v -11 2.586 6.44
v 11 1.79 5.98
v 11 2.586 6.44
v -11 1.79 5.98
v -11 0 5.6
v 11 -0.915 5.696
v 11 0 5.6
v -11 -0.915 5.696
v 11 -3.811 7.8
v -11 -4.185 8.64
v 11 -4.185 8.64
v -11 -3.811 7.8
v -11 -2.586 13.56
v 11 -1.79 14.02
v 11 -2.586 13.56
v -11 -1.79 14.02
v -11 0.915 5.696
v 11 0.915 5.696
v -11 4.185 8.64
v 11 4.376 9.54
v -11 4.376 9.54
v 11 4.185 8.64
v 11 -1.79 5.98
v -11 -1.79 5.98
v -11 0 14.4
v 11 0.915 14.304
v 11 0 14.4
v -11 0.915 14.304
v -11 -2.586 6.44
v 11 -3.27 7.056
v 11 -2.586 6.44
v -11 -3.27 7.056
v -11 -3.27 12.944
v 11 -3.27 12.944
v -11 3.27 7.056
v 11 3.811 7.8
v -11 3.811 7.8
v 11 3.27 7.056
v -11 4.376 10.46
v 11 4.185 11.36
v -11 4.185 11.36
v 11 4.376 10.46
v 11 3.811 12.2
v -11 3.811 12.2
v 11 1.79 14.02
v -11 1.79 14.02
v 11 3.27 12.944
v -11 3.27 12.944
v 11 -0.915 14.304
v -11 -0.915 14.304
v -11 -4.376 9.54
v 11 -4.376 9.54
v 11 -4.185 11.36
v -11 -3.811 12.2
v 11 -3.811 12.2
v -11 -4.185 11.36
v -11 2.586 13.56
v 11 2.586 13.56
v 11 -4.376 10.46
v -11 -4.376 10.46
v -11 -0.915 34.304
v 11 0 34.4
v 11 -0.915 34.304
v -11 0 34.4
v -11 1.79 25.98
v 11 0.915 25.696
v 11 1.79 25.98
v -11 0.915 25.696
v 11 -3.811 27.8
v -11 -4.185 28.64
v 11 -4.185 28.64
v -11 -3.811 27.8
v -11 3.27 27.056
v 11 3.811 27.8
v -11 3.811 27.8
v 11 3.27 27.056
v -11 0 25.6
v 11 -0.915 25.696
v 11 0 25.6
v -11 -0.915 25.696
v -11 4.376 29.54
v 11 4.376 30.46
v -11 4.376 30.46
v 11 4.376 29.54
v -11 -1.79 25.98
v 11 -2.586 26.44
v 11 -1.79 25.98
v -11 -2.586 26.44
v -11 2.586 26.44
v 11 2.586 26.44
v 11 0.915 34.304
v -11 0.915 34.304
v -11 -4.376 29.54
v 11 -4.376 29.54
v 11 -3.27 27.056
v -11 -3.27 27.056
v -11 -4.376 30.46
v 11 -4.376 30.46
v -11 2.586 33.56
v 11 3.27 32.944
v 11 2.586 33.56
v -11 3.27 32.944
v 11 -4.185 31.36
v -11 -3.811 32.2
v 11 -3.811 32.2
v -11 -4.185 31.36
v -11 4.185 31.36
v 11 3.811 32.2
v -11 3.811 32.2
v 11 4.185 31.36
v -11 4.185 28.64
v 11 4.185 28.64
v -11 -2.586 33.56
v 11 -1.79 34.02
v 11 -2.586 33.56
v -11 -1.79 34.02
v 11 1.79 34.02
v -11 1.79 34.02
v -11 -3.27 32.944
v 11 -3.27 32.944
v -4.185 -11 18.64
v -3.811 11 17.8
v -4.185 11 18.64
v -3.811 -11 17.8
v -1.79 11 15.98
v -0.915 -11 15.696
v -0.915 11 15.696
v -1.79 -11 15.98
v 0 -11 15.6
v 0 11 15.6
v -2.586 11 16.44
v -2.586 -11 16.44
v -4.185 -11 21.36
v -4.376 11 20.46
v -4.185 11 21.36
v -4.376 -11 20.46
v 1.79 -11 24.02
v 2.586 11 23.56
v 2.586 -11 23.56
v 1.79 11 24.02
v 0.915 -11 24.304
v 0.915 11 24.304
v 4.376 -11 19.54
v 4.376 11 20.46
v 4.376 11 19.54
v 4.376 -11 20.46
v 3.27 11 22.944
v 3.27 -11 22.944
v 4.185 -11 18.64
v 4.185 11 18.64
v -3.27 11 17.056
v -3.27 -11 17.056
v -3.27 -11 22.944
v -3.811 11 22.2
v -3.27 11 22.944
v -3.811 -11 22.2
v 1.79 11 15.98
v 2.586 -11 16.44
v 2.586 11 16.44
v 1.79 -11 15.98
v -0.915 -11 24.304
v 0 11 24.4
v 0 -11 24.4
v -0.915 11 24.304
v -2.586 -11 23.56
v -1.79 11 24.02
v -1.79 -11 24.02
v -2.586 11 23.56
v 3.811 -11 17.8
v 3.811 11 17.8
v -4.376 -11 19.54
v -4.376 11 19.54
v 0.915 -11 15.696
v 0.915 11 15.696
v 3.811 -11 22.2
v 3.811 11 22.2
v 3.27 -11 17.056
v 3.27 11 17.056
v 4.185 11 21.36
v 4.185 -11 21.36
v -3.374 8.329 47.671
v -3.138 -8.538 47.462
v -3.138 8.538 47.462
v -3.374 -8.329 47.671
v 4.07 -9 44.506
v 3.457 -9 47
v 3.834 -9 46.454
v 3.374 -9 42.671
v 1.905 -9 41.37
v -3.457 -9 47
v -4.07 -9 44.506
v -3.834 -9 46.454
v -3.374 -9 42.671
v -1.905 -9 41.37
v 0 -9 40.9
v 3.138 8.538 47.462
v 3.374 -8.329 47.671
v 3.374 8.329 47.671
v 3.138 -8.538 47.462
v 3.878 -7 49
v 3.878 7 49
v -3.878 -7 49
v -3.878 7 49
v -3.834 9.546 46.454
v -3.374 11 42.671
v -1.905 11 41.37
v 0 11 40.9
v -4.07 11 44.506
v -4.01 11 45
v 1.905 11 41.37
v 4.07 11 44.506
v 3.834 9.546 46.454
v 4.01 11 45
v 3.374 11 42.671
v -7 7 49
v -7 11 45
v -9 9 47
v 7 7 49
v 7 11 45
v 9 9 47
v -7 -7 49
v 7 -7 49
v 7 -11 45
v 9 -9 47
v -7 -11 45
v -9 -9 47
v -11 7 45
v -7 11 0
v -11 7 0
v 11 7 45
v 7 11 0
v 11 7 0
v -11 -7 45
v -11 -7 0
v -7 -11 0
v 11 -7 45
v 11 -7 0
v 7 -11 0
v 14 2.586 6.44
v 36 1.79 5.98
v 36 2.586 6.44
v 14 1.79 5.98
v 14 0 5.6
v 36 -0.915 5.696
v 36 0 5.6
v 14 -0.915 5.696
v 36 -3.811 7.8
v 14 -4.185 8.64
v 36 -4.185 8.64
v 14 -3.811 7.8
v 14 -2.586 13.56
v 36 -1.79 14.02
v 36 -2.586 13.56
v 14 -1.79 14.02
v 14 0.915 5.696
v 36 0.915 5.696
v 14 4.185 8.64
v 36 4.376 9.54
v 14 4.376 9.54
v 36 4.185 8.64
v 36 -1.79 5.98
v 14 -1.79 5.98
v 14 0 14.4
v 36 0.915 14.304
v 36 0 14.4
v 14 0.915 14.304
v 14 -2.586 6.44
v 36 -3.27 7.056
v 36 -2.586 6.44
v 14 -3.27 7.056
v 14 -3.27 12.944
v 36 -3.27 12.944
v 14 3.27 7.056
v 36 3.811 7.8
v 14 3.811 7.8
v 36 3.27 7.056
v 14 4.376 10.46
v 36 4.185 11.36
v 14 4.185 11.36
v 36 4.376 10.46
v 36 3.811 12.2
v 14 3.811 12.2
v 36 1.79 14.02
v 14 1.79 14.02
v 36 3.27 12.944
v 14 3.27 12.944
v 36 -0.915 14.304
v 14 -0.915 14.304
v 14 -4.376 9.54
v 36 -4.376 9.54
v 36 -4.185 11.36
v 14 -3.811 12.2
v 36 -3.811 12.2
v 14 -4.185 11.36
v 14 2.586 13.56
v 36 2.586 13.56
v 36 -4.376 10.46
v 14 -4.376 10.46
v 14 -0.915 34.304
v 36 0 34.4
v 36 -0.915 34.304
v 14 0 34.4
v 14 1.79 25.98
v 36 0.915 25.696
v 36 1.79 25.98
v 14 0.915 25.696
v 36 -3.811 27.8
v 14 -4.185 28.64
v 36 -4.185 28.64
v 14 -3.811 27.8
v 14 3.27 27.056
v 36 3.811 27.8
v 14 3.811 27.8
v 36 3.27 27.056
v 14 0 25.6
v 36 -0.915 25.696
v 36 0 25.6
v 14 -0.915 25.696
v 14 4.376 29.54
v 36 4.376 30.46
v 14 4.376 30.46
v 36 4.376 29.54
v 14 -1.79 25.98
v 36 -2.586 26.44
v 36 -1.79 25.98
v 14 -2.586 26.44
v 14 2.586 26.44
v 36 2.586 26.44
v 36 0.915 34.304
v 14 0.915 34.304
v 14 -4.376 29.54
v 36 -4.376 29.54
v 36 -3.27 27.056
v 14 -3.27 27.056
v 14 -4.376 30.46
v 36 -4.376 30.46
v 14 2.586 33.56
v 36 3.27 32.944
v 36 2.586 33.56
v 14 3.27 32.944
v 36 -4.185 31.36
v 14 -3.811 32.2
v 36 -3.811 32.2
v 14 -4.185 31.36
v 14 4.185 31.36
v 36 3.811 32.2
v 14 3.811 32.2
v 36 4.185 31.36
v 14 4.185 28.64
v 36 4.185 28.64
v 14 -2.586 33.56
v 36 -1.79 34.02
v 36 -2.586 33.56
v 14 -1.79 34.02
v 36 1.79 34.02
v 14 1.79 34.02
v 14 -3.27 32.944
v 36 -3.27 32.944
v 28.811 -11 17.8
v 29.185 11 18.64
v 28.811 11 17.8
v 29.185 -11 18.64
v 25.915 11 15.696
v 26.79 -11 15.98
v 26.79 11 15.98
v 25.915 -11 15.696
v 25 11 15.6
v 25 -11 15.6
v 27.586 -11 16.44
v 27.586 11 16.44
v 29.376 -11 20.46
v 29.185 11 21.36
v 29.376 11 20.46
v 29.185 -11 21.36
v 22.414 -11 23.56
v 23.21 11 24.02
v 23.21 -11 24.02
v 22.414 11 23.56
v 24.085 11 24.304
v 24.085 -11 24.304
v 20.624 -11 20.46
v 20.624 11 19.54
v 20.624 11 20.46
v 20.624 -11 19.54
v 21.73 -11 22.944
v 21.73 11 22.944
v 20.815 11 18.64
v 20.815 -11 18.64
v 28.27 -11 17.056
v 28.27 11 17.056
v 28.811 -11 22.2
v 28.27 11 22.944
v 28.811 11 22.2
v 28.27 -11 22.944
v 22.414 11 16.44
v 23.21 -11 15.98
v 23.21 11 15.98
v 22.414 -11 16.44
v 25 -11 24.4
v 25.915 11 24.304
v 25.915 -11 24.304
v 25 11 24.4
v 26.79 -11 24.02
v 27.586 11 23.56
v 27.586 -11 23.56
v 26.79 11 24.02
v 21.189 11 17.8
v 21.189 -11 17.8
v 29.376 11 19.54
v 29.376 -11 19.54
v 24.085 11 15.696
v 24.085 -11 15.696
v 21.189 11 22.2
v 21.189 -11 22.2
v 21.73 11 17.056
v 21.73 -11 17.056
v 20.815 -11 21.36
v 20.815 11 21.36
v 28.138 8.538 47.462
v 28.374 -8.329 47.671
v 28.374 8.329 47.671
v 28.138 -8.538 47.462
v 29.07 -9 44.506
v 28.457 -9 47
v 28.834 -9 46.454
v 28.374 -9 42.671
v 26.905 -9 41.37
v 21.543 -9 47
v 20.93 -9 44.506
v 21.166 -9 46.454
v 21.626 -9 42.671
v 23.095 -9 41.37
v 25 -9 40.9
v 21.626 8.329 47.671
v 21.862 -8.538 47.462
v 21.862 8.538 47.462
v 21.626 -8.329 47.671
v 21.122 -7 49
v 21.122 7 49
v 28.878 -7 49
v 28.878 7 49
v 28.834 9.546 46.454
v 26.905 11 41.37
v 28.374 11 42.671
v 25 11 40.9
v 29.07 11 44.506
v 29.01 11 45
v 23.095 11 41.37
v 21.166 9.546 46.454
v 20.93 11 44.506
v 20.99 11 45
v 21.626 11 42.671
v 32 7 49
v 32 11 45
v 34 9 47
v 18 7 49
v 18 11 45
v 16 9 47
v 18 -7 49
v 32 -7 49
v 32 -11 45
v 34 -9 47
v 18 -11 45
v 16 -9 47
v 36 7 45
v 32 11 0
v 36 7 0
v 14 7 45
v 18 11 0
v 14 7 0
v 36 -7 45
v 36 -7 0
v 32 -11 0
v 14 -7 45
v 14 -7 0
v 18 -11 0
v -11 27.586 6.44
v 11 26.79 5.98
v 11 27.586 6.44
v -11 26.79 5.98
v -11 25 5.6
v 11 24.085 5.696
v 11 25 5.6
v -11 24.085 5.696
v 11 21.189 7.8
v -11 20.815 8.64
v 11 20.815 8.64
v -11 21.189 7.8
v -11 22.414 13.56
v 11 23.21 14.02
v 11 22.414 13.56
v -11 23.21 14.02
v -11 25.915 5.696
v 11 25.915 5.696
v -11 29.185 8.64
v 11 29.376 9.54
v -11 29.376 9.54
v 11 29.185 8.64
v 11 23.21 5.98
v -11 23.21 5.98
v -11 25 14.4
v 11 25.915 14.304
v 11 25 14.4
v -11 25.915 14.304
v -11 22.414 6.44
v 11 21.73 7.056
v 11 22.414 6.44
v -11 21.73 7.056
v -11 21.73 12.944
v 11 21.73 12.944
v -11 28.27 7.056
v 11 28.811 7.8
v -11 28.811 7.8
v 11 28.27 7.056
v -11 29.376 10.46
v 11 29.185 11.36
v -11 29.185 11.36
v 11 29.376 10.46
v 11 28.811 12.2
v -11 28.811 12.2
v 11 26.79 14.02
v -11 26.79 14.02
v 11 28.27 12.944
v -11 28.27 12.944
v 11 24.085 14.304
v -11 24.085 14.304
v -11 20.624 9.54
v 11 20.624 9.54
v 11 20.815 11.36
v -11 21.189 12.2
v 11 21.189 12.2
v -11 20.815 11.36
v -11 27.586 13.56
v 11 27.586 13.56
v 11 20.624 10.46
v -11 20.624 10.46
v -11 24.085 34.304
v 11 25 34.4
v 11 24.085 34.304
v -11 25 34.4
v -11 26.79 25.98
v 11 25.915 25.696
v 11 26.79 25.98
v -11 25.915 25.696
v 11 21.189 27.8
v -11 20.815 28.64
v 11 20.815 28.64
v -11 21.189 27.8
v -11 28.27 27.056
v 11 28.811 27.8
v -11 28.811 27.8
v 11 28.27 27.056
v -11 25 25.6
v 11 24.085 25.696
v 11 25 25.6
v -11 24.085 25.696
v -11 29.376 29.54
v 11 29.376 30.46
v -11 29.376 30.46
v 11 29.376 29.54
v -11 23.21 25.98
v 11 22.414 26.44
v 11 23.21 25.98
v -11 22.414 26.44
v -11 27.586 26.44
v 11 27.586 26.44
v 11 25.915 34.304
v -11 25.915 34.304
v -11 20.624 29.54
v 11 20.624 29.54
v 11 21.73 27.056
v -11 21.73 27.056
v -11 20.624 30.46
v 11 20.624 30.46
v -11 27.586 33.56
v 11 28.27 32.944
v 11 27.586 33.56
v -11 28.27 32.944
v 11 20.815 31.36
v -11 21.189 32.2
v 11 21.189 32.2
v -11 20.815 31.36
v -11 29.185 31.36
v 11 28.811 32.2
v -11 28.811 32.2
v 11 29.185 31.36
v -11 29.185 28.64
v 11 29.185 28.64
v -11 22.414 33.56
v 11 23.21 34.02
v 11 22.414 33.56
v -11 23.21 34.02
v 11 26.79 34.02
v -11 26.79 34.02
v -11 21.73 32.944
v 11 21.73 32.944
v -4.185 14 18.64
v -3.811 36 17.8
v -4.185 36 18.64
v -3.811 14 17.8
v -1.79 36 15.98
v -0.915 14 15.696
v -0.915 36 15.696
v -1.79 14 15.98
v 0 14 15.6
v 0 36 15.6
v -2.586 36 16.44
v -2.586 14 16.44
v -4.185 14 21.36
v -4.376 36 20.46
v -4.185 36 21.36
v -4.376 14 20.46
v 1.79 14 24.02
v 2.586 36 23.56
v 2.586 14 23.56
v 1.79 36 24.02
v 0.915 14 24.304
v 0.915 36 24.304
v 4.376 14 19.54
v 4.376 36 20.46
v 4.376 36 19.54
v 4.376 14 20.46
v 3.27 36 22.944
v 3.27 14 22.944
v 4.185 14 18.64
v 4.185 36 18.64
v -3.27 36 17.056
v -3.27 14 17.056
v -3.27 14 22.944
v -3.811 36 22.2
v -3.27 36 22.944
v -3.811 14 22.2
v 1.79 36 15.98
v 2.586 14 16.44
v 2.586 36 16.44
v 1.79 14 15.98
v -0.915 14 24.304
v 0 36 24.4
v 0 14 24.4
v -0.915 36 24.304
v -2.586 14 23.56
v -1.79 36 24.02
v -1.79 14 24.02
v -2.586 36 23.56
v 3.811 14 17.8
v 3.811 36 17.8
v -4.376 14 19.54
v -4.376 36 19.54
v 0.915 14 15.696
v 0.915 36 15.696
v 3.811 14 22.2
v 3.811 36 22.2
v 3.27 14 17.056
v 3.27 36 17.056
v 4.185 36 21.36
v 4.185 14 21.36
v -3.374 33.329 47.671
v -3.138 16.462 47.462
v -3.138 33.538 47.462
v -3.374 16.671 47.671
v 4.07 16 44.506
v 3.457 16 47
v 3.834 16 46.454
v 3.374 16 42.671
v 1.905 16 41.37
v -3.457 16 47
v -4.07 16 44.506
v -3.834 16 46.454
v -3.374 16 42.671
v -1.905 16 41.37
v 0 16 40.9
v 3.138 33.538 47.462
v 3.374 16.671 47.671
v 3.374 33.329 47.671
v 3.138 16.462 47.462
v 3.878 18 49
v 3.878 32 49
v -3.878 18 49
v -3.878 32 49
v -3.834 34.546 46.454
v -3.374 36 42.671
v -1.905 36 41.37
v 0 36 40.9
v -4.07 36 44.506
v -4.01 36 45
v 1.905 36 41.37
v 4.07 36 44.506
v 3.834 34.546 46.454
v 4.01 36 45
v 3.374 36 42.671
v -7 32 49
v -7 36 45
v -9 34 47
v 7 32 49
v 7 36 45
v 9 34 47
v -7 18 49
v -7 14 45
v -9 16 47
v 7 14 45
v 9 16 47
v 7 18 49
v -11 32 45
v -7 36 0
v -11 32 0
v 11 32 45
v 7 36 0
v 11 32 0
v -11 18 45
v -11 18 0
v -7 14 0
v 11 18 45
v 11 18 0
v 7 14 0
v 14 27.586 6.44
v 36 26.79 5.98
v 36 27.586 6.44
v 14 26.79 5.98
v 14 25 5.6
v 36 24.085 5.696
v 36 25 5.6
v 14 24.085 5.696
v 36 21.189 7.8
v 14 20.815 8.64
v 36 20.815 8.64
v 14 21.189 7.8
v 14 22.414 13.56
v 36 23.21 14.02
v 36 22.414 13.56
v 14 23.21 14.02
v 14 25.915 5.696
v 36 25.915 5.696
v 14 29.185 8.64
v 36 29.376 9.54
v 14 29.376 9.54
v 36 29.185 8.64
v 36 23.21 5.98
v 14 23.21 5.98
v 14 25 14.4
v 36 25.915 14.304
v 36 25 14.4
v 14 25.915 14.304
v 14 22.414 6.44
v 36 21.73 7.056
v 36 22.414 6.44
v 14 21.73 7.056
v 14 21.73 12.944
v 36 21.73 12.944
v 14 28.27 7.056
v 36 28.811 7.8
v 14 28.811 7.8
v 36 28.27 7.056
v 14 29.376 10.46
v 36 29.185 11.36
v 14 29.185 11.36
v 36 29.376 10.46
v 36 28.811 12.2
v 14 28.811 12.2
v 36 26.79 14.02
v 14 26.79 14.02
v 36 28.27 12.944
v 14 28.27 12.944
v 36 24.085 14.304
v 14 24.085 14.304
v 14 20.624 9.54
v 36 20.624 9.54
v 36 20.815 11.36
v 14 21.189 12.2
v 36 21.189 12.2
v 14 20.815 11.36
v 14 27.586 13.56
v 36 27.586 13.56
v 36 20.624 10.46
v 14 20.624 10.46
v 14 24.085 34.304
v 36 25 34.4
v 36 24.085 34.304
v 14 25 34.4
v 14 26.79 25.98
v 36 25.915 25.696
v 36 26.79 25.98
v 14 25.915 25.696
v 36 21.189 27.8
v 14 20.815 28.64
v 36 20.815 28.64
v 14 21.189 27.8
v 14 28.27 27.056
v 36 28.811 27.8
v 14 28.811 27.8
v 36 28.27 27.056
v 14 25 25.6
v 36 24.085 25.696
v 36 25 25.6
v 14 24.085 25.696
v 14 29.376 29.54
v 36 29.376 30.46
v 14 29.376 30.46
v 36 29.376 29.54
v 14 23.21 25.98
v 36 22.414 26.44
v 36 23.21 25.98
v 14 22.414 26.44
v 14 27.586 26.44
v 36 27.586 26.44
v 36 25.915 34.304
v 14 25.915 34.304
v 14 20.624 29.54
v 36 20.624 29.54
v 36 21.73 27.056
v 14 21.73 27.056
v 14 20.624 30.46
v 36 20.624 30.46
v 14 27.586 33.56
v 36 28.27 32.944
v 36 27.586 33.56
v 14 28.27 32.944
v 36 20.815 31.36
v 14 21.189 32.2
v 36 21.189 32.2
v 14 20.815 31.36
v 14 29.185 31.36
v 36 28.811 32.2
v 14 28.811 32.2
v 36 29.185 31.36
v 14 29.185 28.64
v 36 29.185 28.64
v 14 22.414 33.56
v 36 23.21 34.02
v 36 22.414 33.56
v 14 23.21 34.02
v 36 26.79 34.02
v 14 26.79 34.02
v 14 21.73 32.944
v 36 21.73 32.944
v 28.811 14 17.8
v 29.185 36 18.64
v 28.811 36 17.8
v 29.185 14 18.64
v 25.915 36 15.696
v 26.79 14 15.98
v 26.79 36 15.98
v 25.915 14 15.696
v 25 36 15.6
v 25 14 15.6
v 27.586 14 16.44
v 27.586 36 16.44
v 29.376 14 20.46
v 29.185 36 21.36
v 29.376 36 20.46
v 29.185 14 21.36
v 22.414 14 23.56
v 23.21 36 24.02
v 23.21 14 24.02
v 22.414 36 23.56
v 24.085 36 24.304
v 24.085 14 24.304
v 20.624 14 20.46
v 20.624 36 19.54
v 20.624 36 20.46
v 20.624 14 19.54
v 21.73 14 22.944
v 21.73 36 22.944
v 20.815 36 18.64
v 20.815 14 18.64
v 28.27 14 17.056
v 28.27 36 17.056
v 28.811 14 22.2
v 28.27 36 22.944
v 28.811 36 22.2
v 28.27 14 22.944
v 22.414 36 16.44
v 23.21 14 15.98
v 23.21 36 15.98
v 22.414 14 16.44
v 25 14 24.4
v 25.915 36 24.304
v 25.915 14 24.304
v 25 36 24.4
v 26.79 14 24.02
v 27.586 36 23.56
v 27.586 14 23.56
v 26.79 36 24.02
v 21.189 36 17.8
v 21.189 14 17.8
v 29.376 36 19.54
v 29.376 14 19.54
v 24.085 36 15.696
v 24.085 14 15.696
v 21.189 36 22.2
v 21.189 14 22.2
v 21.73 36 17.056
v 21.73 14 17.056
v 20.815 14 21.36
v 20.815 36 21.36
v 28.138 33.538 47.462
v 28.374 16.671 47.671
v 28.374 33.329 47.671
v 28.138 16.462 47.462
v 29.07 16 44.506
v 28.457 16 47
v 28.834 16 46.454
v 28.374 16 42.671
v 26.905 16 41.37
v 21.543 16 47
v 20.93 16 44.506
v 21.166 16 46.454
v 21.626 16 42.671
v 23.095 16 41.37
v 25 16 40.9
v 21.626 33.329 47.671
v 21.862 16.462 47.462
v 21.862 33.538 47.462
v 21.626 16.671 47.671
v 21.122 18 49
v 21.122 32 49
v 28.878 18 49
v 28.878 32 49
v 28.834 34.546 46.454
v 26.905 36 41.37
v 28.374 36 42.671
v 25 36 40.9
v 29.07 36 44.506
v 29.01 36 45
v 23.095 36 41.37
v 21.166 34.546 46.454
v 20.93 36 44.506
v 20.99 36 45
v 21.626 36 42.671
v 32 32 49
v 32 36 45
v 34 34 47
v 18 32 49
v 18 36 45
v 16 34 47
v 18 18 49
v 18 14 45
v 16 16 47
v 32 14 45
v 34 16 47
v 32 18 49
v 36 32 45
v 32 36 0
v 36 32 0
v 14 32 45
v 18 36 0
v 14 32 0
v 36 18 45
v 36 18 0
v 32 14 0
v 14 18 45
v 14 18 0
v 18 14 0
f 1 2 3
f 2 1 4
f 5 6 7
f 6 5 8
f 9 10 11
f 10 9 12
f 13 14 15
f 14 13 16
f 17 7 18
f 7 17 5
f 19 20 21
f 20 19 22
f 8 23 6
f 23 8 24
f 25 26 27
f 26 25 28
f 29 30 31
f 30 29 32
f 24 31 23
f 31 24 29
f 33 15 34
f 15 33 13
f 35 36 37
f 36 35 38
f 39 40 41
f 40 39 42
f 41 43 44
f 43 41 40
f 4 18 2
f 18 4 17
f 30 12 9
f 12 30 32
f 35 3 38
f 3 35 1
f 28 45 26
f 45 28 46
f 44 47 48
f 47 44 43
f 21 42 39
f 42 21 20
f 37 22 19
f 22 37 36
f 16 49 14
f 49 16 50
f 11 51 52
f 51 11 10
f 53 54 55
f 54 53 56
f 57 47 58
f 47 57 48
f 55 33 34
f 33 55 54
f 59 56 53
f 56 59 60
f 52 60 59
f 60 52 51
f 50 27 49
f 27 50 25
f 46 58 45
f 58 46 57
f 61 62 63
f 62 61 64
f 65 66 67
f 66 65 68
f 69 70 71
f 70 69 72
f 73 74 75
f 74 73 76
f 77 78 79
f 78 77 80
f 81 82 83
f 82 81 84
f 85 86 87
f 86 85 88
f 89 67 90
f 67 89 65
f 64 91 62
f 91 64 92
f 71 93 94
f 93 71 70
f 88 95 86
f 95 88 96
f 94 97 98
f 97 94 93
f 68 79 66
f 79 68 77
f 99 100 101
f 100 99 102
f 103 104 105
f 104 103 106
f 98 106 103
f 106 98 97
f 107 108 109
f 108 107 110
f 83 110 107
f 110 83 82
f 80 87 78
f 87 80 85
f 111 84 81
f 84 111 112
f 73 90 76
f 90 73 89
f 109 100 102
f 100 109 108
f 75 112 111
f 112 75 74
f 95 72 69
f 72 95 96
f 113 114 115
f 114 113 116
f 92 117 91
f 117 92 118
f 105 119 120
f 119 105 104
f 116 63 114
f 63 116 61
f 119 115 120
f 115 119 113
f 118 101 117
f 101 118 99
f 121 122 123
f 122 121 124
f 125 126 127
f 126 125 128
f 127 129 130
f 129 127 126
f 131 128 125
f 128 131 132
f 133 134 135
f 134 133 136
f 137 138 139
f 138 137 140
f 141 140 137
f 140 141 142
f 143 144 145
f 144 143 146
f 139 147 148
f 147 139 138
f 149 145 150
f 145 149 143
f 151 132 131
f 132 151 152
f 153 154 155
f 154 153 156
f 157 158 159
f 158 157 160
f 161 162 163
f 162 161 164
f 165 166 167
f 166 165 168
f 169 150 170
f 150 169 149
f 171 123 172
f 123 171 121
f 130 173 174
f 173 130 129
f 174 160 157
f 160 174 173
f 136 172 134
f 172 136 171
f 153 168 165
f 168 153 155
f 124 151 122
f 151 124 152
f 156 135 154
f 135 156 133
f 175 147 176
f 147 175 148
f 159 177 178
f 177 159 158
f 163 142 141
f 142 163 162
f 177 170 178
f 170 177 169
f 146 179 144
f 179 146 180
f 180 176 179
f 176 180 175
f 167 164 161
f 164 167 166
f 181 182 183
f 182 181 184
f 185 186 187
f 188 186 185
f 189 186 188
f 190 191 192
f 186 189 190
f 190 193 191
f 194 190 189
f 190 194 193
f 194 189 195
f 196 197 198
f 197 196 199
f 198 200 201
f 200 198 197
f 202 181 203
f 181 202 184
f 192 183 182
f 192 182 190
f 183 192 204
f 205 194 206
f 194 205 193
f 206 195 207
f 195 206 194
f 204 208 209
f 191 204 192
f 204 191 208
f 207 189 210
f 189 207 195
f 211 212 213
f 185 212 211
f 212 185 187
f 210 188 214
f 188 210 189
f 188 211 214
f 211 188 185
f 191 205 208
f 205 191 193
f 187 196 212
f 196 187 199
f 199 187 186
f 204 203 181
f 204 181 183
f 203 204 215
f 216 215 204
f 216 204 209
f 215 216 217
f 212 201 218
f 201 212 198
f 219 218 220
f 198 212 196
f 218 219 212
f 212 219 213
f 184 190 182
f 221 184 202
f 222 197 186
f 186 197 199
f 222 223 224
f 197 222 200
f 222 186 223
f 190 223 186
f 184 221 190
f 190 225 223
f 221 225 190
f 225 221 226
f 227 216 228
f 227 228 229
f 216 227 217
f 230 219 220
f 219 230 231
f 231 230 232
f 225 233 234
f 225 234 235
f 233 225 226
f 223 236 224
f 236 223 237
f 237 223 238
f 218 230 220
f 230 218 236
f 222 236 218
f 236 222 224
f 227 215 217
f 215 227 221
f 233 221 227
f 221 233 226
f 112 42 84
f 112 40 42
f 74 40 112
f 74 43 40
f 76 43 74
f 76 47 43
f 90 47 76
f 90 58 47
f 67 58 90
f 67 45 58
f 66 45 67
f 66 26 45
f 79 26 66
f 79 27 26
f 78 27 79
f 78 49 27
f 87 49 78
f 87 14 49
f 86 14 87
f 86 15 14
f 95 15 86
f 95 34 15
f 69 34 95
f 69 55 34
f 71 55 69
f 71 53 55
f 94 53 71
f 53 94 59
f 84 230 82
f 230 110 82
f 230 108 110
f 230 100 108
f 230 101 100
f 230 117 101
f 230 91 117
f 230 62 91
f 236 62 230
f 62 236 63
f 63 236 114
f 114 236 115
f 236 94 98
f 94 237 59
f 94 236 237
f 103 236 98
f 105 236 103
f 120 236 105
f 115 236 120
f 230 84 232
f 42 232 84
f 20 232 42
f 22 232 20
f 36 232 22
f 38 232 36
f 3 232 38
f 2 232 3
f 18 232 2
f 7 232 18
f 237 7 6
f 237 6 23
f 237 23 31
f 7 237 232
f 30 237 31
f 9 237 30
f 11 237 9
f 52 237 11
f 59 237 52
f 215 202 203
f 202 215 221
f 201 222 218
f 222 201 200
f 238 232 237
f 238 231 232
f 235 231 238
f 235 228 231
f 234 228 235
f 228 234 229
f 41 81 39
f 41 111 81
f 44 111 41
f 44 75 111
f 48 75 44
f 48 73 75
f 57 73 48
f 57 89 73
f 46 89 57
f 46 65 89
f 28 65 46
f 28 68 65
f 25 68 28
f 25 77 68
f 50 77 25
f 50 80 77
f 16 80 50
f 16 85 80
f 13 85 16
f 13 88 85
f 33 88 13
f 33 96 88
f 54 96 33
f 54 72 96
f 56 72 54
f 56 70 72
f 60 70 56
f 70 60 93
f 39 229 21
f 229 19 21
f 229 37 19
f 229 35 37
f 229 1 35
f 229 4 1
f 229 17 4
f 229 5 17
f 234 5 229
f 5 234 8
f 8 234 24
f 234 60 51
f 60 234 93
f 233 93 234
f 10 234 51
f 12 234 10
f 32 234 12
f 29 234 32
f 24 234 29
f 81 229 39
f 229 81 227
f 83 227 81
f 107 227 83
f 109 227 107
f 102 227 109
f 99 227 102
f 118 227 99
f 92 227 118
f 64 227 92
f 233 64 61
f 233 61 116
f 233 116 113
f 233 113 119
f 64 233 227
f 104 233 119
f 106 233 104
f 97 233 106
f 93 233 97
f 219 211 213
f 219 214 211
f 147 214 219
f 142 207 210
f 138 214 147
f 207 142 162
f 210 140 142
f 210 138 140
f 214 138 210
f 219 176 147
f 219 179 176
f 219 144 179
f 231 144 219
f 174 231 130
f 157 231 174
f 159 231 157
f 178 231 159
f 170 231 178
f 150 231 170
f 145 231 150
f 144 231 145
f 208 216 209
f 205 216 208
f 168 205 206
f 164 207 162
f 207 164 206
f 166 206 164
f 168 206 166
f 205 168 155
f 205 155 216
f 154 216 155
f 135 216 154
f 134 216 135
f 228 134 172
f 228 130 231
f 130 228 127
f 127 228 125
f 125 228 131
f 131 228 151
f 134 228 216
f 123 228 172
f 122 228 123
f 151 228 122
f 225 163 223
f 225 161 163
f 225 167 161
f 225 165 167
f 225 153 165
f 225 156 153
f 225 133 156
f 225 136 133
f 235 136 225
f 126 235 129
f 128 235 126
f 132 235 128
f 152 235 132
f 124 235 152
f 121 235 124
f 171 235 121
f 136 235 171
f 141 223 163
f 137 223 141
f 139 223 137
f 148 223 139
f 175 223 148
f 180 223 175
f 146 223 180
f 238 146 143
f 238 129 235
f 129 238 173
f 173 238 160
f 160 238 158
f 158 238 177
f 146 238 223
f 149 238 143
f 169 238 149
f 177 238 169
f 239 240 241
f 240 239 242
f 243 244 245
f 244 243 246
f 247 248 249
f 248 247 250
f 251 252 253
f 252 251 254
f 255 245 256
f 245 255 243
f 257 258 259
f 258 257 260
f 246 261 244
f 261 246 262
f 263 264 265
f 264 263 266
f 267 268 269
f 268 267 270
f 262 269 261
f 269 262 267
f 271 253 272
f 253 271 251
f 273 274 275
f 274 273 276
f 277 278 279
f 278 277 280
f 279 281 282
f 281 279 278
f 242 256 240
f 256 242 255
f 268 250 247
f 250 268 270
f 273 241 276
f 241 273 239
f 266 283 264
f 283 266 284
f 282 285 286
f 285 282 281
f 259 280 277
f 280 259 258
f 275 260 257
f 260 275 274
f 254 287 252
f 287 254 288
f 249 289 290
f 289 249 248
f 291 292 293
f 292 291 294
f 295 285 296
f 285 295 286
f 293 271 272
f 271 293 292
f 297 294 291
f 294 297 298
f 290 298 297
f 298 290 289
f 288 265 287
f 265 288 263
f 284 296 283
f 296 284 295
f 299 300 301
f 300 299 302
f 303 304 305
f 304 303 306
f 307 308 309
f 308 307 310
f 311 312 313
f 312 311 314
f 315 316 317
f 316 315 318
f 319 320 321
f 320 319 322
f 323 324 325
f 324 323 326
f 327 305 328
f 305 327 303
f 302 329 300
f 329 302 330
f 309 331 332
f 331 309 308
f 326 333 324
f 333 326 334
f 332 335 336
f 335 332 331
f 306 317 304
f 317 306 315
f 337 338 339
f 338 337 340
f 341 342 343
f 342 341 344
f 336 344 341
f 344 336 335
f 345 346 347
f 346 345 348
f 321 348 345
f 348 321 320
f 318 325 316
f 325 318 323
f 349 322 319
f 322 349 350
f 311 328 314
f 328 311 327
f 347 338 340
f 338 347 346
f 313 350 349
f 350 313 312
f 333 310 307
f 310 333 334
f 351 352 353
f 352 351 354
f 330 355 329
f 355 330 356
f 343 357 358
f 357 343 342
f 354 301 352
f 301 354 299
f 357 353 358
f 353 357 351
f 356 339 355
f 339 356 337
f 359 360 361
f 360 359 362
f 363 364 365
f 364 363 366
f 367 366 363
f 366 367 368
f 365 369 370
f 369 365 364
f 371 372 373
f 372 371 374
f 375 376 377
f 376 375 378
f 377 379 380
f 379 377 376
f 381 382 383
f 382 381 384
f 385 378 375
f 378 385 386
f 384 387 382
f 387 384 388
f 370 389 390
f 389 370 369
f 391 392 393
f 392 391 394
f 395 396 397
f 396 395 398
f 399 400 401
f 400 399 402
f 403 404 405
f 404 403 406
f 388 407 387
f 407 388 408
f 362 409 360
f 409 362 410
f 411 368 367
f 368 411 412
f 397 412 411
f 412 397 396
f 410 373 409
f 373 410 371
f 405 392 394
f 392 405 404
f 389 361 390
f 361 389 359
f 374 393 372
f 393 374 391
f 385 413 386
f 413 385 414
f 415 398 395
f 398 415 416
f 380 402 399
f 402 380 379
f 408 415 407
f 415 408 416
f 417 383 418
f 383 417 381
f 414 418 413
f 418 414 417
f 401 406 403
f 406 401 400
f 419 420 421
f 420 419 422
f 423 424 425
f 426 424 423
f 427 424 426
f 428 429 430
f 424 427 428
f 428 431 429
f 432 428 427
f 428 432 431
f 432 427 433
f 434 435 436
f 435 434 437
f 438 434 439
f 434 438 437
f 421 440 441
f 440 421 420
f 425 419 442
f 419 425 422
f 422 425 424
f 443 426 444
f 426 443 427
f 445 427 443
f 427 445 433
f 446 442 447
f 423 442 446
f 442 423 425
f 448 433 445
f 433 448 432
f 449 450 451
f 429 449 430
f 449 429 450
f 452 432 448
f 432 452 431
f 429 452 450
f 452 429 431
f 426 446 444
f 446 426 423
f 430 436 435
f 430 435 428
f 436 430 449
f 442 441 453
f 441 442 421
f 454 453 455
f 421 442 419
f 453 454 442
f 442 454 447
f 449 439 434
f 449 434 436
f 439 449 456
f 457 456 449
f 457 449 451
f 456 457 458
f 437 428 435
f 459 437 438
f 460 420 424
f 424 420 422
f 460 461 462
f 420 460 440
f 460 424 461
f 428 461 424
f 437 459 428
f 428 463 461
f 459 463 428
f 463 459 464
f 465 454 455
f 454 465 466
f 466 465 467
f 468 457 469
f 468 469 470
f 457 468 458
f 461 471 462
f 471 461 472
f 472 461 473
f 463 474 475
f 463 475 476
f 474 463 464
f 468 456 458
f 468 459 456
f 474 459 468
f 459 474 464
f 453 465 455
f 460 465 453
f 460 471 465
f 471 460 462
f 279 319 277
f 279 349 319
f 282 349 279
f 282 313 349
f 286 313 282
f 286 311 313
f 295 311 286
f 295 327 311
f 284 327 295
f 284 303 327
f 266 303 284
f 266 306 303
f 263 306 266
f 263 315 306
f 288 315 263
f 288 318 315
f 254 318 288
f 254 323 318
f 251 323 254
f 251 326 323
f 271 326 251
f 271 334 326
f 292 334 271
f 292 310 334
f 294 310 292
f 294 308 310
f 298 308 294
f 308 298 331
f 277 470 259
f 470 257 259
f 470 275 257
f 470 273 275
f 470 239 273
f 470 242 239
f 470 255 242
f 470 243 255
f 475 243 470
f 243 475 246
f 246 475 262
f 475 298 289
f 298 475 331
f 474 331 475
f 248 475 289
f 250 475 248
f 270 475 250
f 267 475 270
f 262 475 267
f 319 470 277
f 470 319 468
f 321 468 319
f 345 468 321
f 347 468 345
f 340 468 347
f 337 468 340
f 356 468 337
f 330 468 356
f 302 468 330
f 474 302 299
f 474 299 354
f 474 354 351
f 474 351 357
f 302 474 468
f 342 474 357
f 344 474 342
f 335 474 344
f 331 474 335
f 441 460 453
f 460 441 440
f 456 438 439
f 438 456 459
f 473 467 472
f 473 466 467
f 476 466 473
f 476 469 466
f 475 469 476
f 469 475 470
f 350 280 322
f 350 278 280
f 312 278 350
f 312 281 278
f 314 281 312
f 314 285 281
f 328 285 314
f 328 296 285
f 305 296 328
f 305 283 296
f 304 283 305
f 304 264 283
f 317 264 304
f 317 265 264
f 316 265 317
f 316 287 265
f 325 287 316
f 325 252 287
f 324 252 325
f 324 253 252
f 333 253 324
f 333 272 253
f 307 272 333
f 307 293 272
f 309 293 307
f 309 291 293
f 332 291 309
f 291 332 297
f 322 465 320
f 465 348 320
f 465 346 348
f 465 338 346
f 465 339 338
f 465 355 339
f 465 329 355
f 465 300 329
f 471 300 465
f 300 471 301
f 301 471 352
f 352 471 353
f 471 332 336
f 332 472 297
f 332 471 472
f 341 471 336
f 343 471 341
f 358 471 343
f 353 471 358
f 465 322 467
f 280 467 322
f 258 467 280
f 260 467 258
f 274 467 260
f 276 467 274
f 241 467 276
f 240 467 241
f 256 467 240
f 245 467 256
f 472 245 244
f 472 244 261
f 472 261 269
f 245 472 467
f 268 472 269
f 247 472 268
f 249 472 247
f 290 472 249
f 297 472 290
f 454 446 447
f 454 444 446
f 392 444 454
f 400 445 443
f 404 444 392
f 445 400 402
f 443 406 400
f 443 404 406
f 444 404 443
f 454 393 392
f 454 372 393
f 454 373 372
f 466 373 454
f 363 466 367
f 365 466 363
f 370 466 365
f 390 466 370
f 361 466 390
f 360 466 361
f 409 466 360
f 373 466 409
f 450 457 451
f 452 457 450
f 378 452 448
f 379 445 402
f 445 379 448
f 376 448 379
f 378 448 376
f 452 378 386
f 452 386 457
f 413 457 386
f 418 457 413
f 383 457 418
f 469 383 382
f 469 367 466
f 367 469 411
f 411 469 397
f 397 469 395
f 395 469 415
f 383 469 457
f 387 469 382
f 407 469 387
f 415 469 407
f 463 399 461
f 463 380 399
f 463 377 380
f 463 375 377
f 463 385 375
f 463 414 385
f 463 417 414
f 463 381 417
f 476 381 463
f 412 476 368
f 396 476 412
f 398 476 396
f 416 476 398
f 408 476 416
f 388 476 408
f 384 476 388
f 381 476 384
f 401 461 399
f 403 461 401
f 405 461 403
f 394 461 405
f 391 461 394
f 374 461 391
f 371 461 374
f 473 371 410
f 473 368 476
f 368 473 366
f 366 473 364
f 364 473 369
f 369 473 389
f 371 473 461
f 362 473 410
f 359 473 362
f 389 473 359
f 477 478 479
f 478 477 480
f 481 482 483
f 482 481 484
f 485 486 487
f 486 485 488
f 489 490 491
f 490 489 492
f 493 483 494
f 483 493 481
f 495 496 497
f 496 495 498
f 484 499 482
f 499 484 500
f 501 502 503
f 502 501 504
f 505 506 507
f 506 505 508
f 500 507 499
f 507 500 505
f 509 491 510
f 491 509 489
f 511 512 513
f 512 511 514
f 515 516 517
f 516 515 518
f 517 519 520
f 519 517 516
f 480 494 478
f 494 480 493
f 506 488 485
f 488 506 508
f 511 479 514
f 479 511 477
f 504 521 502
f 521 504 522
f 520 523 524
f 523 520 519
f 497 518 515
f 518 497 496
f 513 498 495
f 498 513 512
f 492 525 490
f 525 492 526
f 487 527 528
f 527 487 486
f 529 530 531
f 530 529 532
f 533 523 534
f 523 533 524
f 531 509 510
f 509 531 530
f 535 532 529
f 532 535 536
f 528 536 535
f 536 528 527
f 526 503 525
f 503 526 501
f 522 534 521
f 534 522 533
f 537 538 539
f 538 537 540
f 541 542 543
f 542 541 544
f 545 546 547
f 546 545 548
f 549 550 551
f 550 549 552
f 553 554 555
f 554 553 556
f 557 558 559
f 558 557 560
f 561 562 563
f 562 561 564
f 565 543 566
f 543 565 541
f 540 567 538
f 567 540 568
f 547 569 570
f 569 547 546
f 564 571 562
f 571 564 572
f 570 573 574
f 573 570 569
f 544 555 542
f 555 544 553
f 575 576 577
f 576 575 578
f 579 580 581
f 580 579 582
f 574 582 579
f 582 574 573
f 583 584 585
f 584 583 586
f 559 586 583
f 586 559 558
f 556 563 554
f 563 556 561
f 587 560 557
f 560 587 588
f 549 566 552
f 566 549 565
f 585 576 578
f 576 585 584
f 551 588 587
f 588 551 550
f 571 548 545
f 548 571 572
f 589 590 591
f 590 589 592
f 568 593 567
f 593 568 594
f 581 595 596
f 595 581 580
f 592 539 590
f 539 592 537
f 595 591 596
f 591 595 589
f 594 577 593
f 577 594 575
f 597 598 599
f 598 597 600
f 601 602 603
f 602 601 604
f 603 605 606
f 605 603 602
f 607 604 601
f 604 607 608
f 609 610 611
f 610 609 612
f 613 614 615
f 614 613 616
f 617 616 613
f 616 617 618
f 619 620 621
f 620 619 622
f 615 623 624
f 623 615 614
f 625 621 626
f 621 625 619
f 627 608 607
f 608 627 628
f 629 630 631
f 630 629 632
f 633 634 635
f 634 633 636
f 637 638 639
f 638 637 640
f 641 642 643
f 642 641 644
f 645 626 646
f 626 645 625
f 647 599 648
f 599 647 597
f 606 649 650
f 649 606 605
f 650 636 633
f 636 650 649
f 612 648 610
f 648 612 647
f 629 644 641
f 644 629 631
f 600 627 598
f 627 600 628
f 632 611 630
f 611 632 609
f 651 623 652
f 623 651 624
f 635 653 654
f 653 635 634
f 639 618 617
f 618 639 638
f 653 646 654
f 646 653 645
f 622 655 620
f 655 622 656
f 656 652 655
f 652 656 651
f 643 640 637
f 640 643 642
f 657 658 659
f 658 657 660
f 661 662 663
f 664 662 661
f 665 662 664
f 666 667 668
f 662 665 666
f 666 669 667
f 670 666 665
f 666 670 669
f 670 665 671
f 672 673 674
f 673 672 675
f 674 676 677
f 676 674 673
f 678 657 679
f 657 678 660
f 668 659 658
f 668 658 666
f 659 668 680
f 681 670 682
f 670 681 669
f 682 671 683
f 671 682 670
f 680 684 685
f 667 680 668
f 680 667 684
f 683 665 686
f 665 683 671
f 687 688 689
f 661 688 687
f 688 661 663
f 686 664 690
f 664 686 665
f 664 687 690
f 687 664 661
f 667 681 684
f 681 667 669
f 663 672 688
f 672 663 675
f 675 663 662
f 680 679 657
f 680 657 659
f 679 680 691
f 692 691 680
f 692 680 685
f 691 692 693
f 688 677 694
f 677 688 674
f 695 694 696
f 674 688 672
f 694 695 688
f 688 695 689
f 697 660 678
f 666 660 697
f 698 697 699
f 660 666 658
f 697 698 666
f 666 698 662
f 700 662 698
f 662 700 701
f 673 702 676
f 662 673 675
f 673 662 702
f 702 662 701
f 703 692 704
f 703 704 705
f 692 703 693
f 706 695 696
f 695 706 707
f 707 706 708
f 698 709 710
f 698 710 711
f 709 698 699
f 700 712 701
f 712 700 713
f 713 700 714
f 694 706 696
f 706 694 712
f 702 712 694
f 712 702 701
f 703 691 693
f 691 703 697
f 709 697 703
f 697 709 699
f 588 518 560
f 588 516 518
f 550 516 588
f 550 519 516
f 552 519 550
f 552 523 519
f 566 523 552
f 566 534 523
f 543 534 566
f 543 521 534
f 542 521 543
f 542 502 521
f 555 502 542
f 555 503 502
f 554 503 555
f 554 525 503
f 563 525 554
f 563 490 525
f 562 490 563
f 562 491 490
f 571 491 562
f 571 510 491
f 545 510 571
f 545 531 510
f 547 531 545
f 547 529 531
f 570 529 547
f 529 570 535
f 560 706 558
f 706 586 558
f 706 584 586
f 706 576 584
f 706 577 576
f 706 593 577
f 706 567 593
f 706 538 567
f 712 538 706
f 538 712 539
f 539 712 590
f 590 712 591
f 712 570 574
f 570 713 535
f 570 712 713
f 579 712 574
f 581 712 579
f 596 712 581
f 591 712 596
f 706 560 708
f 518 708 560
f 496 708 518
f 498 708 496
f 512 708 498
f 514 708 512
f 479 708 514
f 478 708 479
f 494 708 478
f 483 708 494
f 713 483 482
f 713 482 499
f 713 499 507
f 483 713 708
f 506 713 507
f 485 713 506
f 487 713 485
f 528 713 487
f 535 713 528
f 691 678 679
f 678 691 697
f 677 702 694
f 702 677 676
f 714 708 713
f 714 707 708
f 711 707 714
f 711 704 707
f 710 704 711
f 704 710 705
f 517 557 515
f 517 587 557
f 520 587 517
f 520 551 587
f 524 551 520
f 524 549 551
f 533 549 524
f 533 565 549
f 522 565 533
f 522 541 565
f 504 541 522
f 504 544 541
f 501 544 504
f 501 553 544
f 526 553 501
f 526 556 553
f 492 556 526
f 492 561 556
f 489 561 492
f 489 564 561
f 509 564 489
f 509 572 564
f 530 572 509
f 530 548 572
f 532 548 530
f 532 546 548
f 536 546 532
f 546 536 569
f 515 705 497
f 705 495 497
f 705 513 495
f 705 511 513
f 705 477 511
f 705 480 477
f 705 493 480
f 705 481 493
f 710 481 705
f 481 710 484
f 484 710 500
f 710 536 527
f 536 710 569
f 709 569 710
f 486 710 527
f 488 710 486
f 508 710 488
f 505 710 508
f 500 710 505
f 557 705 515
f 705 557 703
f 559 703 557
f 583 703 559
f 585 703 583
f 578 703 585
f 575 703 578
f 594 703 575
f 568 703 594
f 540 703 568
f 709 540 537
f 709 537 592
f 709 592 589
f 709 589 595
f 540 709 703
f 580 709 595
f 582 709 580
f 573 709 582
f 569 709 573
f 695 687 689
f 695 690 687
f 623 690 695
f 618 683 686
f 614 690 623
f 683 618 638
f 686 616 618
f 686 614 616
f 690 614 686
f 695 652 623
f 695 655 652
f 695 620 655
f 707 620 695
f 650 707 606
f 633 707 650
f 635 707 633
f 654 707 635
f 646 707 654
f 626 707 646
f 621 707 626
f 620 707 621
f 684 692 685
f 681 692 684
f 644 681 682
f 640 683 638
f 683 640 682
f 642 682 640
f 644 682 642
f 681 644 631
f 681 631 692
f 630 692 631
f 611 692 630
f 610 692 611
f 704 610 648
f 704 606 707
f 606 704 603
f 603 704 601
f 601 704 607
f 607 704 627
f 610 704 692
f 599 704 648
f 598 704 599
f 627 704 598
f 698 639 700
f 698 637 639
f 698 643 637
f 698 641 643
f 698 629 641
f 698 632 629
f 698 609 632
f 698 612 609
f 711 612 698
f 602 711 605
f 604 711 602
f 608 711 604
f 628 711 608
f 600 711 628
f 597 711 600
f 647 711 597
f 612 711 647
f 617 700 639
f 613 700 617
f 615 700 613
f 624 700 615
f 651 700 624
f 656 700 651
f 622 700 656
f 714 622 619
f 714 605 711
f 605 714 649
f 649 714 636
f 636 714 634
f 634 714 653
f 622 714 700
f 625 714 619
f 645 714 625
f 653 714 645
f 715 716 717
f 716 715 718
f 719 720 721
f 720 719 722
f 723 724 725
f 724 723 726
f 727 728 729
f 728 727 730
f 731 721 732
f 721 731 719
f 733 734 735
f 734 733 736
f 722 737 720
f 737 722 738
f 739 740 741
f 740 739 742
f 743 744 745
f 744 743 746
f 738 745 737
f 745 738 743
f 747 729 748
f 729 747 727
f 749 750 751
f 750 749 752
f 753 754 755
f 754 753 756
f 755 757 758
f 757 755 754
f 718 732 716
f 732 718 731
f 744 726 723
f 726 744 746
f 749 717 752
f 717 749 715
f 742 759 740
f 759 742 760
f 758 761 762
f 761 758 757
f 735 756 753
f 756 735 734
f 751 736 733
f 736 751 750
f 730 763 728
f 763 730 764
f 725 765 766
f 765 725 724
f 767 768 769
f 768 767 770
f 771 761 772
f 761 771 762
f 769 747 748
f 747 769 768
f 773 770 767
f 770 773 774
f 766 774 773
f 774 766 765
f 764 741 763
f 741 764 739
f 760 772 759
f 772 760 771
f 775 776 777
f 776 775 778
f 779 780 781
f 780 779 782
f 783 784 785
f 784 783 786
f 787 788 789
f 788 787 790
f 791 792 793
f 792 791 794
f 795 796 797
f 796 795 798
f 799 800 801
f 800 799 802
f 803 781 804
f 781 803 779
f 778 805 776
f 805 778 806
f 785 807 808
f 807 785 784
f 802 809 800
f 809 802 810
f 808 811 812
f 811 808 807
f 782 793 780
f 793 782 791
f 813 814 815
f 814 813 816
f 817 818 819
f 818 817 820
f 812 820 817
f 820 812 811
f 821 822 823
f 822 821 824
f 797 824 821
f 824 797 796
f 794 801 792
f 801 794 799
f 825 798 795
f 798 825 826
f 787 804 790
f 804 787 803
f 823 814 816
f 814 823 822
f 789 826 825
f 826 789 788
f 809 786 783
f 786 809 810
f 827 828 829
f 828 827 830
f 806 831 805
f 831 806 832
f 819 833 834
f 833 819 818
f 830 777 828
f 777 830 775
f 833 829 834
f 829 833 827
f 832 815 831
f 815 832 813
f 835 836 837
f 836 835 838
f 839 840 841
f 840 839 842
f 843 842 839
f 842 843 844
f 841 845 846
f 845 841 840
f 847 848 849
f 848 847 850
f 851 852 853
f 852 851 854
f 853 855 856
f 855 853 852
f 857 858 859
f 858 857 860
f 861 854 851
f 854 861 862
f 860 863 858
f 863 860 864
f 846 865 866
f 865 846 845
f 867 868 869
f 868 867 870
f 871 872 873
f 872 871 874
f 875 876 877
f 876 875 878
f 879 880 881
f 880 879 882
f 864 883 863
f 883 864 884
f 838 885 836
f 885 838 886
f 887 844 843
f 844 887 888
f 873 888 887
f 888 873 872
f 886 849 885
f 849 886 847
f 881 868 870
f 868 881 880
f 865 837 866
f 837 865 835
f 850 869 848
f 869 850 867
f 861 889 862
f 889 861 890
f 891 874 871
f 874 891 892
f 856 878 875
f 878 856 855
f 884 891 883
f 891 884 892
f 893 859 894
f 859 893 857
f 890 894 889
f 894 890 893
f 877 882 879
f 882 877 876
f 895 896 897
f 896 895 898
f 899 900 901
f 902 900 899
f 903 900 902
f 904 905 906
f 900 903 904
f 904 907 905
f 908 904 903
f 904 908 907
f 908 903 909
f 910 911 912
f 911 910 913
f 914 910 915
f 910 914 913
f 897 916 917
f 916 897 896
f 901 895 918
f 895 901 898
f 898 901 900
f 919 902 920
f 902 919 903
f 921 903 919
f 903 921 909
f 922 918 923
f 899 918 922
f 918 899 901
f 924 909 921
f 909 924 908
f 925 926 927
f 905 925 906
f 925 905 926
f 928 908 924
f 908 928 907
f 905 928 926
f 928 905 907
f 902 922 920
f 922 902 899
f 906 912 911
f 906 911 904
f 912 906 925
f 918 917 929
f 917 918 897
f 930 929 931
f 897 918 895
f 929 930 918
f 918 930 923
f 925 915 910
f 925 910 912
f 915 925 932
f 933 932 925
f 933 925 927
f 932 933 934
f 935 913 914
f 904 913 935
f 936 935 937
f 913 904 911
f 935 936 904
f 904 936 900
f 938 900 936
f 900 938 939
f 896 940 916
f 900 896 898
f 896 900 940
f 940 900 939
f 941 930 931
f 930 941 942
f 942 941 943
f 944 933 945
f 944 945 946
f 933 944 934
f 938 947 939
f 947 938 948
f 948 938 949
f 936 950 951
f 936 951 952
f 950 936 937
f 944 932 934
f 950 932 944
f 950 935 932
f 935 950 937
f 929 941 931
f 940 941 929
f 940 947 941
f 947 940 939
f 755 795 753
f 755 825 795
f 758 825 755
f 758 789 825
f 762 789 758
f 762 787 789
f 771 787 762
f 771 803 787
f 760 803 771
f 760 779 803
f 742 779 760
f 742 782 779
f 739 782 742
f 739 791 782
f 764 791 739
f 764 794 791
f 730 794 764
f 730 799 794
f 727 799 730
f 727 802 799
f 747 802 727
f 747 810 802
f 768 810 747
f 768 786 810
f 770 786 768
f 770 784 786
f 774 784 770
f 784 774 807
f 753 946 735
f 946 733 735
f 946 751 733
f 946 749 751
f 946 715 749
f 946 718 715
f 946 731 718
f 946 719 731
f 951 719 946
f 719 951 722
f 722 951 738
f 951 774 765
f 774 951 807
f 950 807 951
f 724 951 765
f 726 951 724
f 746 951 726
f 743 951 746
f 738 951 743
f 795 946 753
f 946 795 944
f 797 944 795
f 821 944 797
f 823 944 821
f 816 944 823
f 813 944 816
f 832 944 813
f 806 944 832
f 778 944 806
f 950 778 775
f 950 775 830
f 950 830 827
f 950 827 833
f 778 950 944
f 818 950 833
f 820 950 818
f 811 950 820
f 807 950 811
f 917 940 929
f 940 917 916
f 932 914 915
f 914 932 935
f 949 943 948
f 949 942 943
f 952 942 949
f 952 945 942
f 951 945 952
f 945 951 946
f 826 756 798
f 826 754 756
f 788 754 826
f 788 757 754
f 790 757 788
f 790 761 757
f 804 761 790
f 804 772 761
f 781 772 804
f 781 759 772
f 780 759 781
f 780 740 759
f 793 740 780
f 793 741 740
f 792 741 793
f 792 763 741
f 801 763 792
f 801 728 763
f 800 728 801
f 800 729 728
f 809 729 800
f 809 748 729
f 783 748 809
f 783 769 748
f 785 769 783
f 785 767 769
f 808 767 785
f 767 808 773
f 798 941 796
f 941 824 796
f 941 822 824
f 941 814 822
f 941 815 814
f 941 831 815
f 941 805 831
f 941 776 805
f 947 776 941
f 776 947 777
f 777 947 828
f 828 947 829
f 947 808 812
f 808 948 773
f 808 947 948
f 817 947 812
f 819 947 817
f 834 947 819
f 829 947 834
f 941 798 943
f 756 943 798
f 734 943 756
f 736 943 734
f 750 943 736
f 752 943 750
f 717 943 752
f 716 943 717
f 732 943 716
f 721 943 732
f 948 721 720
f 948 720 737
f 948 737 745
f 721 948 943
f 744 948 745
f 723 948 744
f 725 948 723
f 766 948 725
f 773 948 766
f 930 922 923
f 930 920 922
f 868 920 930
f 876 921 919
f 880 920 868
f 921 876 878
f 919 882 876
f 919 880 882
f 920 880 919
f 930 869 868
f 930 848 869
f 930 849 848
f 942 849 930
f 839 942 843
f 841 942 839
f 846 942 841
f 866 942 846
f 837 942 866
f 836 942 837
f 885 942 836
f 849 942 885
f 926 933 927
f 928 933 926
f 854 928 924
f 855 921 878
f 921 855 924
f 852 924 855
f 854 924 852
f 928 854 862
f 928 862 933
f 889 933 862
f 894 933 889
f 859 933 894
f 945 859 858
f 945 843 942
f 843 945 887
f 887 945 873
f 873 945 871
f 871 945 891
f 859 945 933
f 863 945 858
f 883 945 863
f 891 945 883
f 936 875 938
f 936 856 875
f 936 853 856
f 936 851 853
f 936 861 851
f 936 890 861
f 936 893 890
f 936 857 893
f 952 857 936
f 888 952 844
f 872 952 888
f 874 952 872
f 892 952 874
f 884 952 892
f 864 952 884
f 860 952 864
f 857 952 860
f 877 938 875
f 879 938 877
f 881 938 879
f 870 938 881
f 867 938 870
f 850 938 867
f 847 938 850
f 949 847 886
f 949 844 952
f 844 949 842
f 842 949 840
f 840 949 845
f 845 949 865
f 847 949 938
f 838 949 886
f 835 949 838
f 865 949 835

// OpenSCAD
// file: inc/functions.scad
// PRUSA iteration3
// Functions used in many files
// GNU GPL v3
// Josef Průša <josefprusa@me.com>
// Václav 'ax' Hůla <axtheb@gmail.com>
// Vlnofka <>
// http://www.reprap.org/wiki/Prusa_Mendel
// http://github.com/prusajr/PrusaMendel


module nut(d,h,horizontal=true){
    cornerdiameter =  (d / 2) / cos (180 / 6);
    cylinder(h = h, r = cornerdiameter, $fn = 6);
    if(horizontal){
        for(i = [1:6]){
            rotate([0,0,60*i]) translate([-cornerdiameter-0.2,0,0]) rotate([0,0,-45]) cube([2,2,h]);
        }
    }
}

// Based on nophead research
module polyhole(d, h, center=false) {
    n = max(round(2 * d),3);
    rotate([0,0,180])
        cylinder(h = h, r = (d / 2) / cos (180 / n), $fn = n);
}

// make it interchangeable between this and cylinder
module cylinder_poly(r, h, center=false){
    polyhole(d=r*2, h=h, center=center);
}

module fillet(radius, height=100, $fn=0) {
    //this creates acutal fillet
    translate([-radius, -radius, -height/2-0.01])
        difference() {
            cube([radius*2, radius*2, height+0.02]);
            cylinder(r=radius, h=height+0.02, $fn=$fn);
        }
}

module cube_fillet(size, radius=-1, vertical=[3,3,3,3], top=[0,0,0,0], bottom=[0,0,0,0], center=false, $fn=0){
    //
    if (center) {
        cube_fillet_inside(size, radius, vertical, top, bottom, $fn);
    } else {
        translate([size[0]/2, size[1]/2, size[2]/2])
            cube_fillet_inside(size, radius, vertical, top, bottom, $fn);
    }
}

module cube_negative_fillet(size, radius=-1, vertical=[3,3,3,3], top=[0,0,0,0], bottom=[0,0,0,0], $fn=0){

    j=[1,0,1,0];

    for (i=[0:3]) {
        if (radius > -1) {
            rotate([0, 0, 90*i]) translate([size[1-j[i]]/2, size[j[i]]/2, 0]) fillet(radius, size[2], $fn=$fn);
        } else {
            rotate([0, 0, 90*i]) translate([size[1-j[i]]/2, size[j[i]]/2, 0]) fillet(vertical[i], size[2], $fn=$fn);
        }
        rotate([90*i, -90, 0]) translate([size[2]/2, size[j[i]]/2, 0 ]) fillet(top[i], size[1-j[i]], $fn=$fn);
        rotate([90*(4-i), 90, 0]) translate([size[2]/2, size[j[i]]/2, 0]) fillet(bottom[i], size[1-j[i]], $fn=$fn);

    }
}

module cube_fillet_inside(size, radius=-1, vertical=[3,3,3,3], top=[0,0,0,0], bottom=[0,0,0,0], $fn=0){
    //makes CENTERED cube with round corners
    // if you give it radius, it will fillet vertical corners.
    //othervise use vertical, top, bottom arrays
    //when viewed from top, it starts in upper right corner (+x,+y quadrant) , goes counterclockwise
    //top/bottom fillet starts in direction of Y axis and goes CCW too


    if (radius == 0) {
        cube(size, center=true);
    } else {
        difference() {
            cube(size, center=true);
            cube_negative_fillet(size, radius, vertical, top, bottom, $fn);
        }
    }
}


module nema17(places=[1,1,1,1], size=15.5, h=10, holes=false, shadow=false, $fn=0){
    for (i=[0:3]) {
        if (places[i] == 1) {
            rotate([0, 0, 90*i]) translate([size, size, 0]) {
                if (holes) {
                    rotate([0, 0, -90*i])  translate([0,0,-10]) screw(r=1.7, slant=false, head_drop=13, $fn=$fn, h=h+12);
                } else {
                    rotate([0, 0, -90*i]) cylinder(h=h, r=5.5, $fn=$fn);
                }
            }
        }
    }
    if (shadow != false) {
        %translate ([0, 0, shadow+21+3]) cube([42,42,42], center = true);
    //flange
        %translate ([0, 0, shadow+21+3-21-1]) cylinder(r=11,h=2, center = true, $fn=20);
    //shaft
        %translate ([0, 0, shadow+21+3-21-7]) cylinder(r=2.5,h=14, center = true);
    }
}

module screw(h=20, r=2, r_head=3.5, head_drop=0, slant=true, poly=false, $fn=0){
    //makes screw with head
    //for substraction as screw hole
    if (poly) {
        cylinder_poly(h=h, r=r, $fn=$fn);
    } else {
        cylinder(h=h, r=r, $fn=$fn);
    }
    if (slant) {
        translate([0, 0, head_drop-0.01]) cylinder(h=r_head, r2=0, r1=r_head, $fn=$fn);
    }

    if (head_drop > 0) {
        translate([0, 0, -0.01]) cylinder(h=head_drop+0.01, r=r_head, $fn=$fn);
    }
}

//cube_fillet([10,20,30], vertical=[3,2,0,0], top=[3,2,0,5], bottom=[3,2,0,5]);
//cube_fillet([10,20,30], radius=2, top=[7,2,7,2]);
// file: inc/metric.scad
// PRUSA iteration3
// Default metric sizes
// GNU GPL v3
// Josef Průša <josefprusa@me.com>
// http://www.reprap.org/wiki/Prusa_Mendel
// http://github.com/prusajr/PrusaMendel

// DONT CHANGE THIS FILE! ALTER VALUES IN CONFIGURATION.SCAD INSTEAD

// RODS

threaded_rod_diameter = 8.7;
threaded_rod_diameter_horizontal = 8.7;
smooth_bar_diameter = 8;
smooth_bar_diameter_horizontal = 8.5;

// Nuts and bolts

m8_diameter = 9;
m8_nut_diameter = 14.1;

m4_diameter = 4.5;
m4_nut_diameter = 9;

m3_diameter = 3.6;
m3_nut_diameter = 5.3;
m3_nut_diameter_horizontal = 6.1;

// Bushing holder

bushing_core_diameter = smooth_bar_diameter;
bushing_material_thickness = 1;

// Motors

motor_shaft = 5.5;
// file: y-drivetrain.scad
// PRUSA iteration3
// Y drivetrain (idler and stepper holders)
// GNU GPL v3
// Josef Průša <josefprusa@me.com>
// Václav 'ax' Hůla <axtheb@gmail.com>
// http://www.reprap.org/wiki/Prusa_Mendel
// http://github.com/prusajr/PrusaMendel

include <configuration.scad>

module motorholder(thickness=10){
    difference(){
        union(){
            // Motor holding part
            translate([29,-21+50,0])
            {
                //#cube([42,42,2], center=true);
                difference(){
                    union(){
                        translate([-21+4.5,0,5]) cube([9,31,thickness], center=true);
                        nema17([0,1,1,0], thickness=thickness, shadow=false);
                        mirror([0,0,1])translate([0,0,-10])nema17([0,1,1,0], thickness=thickness, shadow=7);
                        // Parts joining part
                        translate([-29,-21,0]) cube([14,30,thickness]);
                    }
                    // Motor mounting holes
                    translate([0,0,thickness]) mirror([0,0,1]) nema17([0,1,1,0], thickness=thickness, holes=true);
                }
            }

            // Front holding part
            translate([0,10,0]) cylinder(h = thickness, r=8);
            translate([0,20,5]) cube([16,20,thickness], center=true);
            translate([0,30,0]) cylinder(h = thickness, r=8);
        }
        translate([0,10,-1]) cylinder(h = 12, r=4.5);
        translate([0,30,-1]) cylinder(h = 12, r=4.5);
    }
}


module idlermount(support=false){
    difference(){
        union(){
            translate([8,8,0]) cylinder(h = 19, r=8);
            translate([8,33,0]) cylinder(h = 19, r=8);
            translate([0,7,0]) cube([16,27,19]);
        }
        translate([8,8,-1]) cylinder(h = 120, r=idler_size_inner_r);
        translate([8,33,-1]) cylinder(h = 25, r=4.5);

        translate([8,8,4]) {
            %translate([0,0,1]) cylinder(h = 9, r=(idler_size/2)+2*single_wall_width);
            cylinder(h = 11, r=(idler_size/2)+8);
        }
    }
    if (support) {
        translate([0,-2,15]) cube([16,16,0.4]);
        translate([0,-2,0]) cube([16,1.3,15]);
    }

}

motorholder();
translate([25,0,0])  idlermount(true);
// file: configuration.scad
// PRUSA Mendel  
// Configuration file
// GNU GPL v3
// Josef Průša
// josefprusa@me.com
// prusadjs.cz
// http://www.reprap.org/wiki/Prusa_Mendel
// http://github.com/prusajr/PrusaMendel

// PLEASE SELECT ONE OF THE CONFIGURATIONS BELOW
// BY UN-COMMENTING IT

// Uncomment for metric settings
// METRIC METRIC METRIC METRIC METRIC METRIC METRIC METRIC 

include <inc/metric.scad>;

// CUSTOM CUSTOM CUSTOM CUSTOM CUSTOM CUSTOM CUSTOM CUSTOM CUSTOM

thin_wall = 3;


// Linear bearing version
linear = false;
// set false for LM-8UU, true for LM-E-8UU (ignore if linear is set to false)
lme8uu = false;

//Machine dimensions

board_thickness = 16;
board_to_xz_distance = 26;

belt_tooth_distance = 2.5;
belt_tooth_stride = 0.5;

// CHANGE ONLY THE STUFF YOU KNOW
// IT WILL REPLACE DEFAULT SETTING

// RODS

// threaded_rod_diameter = 0;
// threaded_rod_diameter_horizontal = 0;
// smooth_bar_diameter = 0;
// smooth_bar_diameter_horizontal = 0;

// Nuts and bolts

// m8_diameter = 0;
// m8_nut_diameter = 0;

// m4_diameter = 0;
// m4_nut_diameter = 0;

// m3_diameter = 0;
// m3_nut_diameter = 0;

// Bushing holder

// bushing_core_diameter = smooth_bar_diameter;
// bushing_material_thickness = 0;


///counted stuff
m3_nut_diameter_bigger = ((m3_nut_diameter  / 2) / cos (180 / 6))*2;

// functions
include <inc/functions.scad>
// main file
// PRUSA iteration3
// Y frame corners
// GNU GPL v3
// Josef Průša <iam@josefprusa.cz>
// Contributors Kliment, AxTheB, vlnofka and others.
// http://www.reprap.org/wiki/Prusa3
// http://prusamendel.org

include <configuration.scad>
use <y-drivetrain.scad>

module nutrod(){
    rotate([0,90,0]){
        //translate([0,0,-0.1]) nut(m8_nut_diameter,6.7,false);
        //this is pretty but annoying
        //translate([-7.5/2,0,7/2-1.5]) cube([7.5,15,7], center=true);
        //translate([0,0,-1.5]) cylinder(h = 7, r=7.5);
        translate([0,0,-5]) cylinder(h = 270, r=4.4, $fn=30);
    }
}

/*
   20 mm betwenn the front threaded rods
   25 mm between the side threaded and smooth rod
 */

module corner_base(){	
 translate([-11,-11,0])cube([22,22,49]);
}

module corner_holes(){
 translate([-11,-11,0]){
  translate([0,11,10]) rotate([0,0,0]) nutrod();
  translate([0,11,30]) rotate([0,0,0]) nutrod();
  translate([11,0,20]) rotate([0,0,90]) rotate([00,0,0]) nutrod();
  translate([11,2,50]) rotate([0,90,90]) cylinder(h = 270, r=4.1);
  translate([11,2,45]) rotate([0,90,90]) cylinder(h = 270, r=4.1);
 }
}

module corner_fancy(){
 // corner cutouts
  translate([-9,9,0]) rotate([0,0,45]) translate([-15,0,-1]) cube([30,30,51]);
  translate([9,9,0]) rotate([0,0,-45]) translate([-15,0,-1]) cube([30,30,51]);
  translate([-9,-9,0]) rotate([0,0,-45-180]) translate([-15,0,-1]) cube([30,30,51]);
  translate([9,-9,0]) rotate([0,0,45-180]) translate([-15,0,-1]) cube([30,30,51]);
 // top cutouts
  translate([9,0,49-2]) rotate([0,45,0]) translate([-15,-15,0]) cube([30,30,30]);
  translate([-9,0,49-2]) rotate([0,-45,0]) translate([-15,-15,0]) cube([30,30,30]);
  rotate([0,0,90]){
   translate([9,0,49-2]) rotate([0,45,0]) translate([-15,-15,0]) cube([30,30,30]);
   translate([-9,0,49-2]) rotate([0,-45,0]) translate([-15,-15,0]) cube([30,30,30]);
  }
}


// final corner assembly
module corner(){
 difference(){
  corner_base();
  corner_holes();
  corner_fancy();
 }
}

corner();
translate([25,0,0]) mirror([1,0,0]) corner();
translate([0,25,0]) {
 corner();
 translate([25,0,0]) mirror([1,0,0]) corner();
}
